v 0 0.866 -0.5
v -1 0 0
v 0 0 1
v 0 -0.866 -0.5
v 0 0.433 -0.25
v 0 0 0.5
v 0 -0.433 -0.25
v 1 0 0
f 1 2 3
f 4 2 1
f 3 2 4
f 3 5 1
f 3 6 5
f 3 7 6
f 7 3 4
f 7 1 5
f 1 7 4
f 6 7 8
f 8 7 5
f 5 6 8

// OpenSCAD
rotate(-90, [0, 1, 0]) cylinder(1, 1, 0, $fn=3);
rotate(180, [0, 0, 1]) rotate(-90, [0, 1, 0]) cylinder(1, 0.5, 0, $fn=3);
